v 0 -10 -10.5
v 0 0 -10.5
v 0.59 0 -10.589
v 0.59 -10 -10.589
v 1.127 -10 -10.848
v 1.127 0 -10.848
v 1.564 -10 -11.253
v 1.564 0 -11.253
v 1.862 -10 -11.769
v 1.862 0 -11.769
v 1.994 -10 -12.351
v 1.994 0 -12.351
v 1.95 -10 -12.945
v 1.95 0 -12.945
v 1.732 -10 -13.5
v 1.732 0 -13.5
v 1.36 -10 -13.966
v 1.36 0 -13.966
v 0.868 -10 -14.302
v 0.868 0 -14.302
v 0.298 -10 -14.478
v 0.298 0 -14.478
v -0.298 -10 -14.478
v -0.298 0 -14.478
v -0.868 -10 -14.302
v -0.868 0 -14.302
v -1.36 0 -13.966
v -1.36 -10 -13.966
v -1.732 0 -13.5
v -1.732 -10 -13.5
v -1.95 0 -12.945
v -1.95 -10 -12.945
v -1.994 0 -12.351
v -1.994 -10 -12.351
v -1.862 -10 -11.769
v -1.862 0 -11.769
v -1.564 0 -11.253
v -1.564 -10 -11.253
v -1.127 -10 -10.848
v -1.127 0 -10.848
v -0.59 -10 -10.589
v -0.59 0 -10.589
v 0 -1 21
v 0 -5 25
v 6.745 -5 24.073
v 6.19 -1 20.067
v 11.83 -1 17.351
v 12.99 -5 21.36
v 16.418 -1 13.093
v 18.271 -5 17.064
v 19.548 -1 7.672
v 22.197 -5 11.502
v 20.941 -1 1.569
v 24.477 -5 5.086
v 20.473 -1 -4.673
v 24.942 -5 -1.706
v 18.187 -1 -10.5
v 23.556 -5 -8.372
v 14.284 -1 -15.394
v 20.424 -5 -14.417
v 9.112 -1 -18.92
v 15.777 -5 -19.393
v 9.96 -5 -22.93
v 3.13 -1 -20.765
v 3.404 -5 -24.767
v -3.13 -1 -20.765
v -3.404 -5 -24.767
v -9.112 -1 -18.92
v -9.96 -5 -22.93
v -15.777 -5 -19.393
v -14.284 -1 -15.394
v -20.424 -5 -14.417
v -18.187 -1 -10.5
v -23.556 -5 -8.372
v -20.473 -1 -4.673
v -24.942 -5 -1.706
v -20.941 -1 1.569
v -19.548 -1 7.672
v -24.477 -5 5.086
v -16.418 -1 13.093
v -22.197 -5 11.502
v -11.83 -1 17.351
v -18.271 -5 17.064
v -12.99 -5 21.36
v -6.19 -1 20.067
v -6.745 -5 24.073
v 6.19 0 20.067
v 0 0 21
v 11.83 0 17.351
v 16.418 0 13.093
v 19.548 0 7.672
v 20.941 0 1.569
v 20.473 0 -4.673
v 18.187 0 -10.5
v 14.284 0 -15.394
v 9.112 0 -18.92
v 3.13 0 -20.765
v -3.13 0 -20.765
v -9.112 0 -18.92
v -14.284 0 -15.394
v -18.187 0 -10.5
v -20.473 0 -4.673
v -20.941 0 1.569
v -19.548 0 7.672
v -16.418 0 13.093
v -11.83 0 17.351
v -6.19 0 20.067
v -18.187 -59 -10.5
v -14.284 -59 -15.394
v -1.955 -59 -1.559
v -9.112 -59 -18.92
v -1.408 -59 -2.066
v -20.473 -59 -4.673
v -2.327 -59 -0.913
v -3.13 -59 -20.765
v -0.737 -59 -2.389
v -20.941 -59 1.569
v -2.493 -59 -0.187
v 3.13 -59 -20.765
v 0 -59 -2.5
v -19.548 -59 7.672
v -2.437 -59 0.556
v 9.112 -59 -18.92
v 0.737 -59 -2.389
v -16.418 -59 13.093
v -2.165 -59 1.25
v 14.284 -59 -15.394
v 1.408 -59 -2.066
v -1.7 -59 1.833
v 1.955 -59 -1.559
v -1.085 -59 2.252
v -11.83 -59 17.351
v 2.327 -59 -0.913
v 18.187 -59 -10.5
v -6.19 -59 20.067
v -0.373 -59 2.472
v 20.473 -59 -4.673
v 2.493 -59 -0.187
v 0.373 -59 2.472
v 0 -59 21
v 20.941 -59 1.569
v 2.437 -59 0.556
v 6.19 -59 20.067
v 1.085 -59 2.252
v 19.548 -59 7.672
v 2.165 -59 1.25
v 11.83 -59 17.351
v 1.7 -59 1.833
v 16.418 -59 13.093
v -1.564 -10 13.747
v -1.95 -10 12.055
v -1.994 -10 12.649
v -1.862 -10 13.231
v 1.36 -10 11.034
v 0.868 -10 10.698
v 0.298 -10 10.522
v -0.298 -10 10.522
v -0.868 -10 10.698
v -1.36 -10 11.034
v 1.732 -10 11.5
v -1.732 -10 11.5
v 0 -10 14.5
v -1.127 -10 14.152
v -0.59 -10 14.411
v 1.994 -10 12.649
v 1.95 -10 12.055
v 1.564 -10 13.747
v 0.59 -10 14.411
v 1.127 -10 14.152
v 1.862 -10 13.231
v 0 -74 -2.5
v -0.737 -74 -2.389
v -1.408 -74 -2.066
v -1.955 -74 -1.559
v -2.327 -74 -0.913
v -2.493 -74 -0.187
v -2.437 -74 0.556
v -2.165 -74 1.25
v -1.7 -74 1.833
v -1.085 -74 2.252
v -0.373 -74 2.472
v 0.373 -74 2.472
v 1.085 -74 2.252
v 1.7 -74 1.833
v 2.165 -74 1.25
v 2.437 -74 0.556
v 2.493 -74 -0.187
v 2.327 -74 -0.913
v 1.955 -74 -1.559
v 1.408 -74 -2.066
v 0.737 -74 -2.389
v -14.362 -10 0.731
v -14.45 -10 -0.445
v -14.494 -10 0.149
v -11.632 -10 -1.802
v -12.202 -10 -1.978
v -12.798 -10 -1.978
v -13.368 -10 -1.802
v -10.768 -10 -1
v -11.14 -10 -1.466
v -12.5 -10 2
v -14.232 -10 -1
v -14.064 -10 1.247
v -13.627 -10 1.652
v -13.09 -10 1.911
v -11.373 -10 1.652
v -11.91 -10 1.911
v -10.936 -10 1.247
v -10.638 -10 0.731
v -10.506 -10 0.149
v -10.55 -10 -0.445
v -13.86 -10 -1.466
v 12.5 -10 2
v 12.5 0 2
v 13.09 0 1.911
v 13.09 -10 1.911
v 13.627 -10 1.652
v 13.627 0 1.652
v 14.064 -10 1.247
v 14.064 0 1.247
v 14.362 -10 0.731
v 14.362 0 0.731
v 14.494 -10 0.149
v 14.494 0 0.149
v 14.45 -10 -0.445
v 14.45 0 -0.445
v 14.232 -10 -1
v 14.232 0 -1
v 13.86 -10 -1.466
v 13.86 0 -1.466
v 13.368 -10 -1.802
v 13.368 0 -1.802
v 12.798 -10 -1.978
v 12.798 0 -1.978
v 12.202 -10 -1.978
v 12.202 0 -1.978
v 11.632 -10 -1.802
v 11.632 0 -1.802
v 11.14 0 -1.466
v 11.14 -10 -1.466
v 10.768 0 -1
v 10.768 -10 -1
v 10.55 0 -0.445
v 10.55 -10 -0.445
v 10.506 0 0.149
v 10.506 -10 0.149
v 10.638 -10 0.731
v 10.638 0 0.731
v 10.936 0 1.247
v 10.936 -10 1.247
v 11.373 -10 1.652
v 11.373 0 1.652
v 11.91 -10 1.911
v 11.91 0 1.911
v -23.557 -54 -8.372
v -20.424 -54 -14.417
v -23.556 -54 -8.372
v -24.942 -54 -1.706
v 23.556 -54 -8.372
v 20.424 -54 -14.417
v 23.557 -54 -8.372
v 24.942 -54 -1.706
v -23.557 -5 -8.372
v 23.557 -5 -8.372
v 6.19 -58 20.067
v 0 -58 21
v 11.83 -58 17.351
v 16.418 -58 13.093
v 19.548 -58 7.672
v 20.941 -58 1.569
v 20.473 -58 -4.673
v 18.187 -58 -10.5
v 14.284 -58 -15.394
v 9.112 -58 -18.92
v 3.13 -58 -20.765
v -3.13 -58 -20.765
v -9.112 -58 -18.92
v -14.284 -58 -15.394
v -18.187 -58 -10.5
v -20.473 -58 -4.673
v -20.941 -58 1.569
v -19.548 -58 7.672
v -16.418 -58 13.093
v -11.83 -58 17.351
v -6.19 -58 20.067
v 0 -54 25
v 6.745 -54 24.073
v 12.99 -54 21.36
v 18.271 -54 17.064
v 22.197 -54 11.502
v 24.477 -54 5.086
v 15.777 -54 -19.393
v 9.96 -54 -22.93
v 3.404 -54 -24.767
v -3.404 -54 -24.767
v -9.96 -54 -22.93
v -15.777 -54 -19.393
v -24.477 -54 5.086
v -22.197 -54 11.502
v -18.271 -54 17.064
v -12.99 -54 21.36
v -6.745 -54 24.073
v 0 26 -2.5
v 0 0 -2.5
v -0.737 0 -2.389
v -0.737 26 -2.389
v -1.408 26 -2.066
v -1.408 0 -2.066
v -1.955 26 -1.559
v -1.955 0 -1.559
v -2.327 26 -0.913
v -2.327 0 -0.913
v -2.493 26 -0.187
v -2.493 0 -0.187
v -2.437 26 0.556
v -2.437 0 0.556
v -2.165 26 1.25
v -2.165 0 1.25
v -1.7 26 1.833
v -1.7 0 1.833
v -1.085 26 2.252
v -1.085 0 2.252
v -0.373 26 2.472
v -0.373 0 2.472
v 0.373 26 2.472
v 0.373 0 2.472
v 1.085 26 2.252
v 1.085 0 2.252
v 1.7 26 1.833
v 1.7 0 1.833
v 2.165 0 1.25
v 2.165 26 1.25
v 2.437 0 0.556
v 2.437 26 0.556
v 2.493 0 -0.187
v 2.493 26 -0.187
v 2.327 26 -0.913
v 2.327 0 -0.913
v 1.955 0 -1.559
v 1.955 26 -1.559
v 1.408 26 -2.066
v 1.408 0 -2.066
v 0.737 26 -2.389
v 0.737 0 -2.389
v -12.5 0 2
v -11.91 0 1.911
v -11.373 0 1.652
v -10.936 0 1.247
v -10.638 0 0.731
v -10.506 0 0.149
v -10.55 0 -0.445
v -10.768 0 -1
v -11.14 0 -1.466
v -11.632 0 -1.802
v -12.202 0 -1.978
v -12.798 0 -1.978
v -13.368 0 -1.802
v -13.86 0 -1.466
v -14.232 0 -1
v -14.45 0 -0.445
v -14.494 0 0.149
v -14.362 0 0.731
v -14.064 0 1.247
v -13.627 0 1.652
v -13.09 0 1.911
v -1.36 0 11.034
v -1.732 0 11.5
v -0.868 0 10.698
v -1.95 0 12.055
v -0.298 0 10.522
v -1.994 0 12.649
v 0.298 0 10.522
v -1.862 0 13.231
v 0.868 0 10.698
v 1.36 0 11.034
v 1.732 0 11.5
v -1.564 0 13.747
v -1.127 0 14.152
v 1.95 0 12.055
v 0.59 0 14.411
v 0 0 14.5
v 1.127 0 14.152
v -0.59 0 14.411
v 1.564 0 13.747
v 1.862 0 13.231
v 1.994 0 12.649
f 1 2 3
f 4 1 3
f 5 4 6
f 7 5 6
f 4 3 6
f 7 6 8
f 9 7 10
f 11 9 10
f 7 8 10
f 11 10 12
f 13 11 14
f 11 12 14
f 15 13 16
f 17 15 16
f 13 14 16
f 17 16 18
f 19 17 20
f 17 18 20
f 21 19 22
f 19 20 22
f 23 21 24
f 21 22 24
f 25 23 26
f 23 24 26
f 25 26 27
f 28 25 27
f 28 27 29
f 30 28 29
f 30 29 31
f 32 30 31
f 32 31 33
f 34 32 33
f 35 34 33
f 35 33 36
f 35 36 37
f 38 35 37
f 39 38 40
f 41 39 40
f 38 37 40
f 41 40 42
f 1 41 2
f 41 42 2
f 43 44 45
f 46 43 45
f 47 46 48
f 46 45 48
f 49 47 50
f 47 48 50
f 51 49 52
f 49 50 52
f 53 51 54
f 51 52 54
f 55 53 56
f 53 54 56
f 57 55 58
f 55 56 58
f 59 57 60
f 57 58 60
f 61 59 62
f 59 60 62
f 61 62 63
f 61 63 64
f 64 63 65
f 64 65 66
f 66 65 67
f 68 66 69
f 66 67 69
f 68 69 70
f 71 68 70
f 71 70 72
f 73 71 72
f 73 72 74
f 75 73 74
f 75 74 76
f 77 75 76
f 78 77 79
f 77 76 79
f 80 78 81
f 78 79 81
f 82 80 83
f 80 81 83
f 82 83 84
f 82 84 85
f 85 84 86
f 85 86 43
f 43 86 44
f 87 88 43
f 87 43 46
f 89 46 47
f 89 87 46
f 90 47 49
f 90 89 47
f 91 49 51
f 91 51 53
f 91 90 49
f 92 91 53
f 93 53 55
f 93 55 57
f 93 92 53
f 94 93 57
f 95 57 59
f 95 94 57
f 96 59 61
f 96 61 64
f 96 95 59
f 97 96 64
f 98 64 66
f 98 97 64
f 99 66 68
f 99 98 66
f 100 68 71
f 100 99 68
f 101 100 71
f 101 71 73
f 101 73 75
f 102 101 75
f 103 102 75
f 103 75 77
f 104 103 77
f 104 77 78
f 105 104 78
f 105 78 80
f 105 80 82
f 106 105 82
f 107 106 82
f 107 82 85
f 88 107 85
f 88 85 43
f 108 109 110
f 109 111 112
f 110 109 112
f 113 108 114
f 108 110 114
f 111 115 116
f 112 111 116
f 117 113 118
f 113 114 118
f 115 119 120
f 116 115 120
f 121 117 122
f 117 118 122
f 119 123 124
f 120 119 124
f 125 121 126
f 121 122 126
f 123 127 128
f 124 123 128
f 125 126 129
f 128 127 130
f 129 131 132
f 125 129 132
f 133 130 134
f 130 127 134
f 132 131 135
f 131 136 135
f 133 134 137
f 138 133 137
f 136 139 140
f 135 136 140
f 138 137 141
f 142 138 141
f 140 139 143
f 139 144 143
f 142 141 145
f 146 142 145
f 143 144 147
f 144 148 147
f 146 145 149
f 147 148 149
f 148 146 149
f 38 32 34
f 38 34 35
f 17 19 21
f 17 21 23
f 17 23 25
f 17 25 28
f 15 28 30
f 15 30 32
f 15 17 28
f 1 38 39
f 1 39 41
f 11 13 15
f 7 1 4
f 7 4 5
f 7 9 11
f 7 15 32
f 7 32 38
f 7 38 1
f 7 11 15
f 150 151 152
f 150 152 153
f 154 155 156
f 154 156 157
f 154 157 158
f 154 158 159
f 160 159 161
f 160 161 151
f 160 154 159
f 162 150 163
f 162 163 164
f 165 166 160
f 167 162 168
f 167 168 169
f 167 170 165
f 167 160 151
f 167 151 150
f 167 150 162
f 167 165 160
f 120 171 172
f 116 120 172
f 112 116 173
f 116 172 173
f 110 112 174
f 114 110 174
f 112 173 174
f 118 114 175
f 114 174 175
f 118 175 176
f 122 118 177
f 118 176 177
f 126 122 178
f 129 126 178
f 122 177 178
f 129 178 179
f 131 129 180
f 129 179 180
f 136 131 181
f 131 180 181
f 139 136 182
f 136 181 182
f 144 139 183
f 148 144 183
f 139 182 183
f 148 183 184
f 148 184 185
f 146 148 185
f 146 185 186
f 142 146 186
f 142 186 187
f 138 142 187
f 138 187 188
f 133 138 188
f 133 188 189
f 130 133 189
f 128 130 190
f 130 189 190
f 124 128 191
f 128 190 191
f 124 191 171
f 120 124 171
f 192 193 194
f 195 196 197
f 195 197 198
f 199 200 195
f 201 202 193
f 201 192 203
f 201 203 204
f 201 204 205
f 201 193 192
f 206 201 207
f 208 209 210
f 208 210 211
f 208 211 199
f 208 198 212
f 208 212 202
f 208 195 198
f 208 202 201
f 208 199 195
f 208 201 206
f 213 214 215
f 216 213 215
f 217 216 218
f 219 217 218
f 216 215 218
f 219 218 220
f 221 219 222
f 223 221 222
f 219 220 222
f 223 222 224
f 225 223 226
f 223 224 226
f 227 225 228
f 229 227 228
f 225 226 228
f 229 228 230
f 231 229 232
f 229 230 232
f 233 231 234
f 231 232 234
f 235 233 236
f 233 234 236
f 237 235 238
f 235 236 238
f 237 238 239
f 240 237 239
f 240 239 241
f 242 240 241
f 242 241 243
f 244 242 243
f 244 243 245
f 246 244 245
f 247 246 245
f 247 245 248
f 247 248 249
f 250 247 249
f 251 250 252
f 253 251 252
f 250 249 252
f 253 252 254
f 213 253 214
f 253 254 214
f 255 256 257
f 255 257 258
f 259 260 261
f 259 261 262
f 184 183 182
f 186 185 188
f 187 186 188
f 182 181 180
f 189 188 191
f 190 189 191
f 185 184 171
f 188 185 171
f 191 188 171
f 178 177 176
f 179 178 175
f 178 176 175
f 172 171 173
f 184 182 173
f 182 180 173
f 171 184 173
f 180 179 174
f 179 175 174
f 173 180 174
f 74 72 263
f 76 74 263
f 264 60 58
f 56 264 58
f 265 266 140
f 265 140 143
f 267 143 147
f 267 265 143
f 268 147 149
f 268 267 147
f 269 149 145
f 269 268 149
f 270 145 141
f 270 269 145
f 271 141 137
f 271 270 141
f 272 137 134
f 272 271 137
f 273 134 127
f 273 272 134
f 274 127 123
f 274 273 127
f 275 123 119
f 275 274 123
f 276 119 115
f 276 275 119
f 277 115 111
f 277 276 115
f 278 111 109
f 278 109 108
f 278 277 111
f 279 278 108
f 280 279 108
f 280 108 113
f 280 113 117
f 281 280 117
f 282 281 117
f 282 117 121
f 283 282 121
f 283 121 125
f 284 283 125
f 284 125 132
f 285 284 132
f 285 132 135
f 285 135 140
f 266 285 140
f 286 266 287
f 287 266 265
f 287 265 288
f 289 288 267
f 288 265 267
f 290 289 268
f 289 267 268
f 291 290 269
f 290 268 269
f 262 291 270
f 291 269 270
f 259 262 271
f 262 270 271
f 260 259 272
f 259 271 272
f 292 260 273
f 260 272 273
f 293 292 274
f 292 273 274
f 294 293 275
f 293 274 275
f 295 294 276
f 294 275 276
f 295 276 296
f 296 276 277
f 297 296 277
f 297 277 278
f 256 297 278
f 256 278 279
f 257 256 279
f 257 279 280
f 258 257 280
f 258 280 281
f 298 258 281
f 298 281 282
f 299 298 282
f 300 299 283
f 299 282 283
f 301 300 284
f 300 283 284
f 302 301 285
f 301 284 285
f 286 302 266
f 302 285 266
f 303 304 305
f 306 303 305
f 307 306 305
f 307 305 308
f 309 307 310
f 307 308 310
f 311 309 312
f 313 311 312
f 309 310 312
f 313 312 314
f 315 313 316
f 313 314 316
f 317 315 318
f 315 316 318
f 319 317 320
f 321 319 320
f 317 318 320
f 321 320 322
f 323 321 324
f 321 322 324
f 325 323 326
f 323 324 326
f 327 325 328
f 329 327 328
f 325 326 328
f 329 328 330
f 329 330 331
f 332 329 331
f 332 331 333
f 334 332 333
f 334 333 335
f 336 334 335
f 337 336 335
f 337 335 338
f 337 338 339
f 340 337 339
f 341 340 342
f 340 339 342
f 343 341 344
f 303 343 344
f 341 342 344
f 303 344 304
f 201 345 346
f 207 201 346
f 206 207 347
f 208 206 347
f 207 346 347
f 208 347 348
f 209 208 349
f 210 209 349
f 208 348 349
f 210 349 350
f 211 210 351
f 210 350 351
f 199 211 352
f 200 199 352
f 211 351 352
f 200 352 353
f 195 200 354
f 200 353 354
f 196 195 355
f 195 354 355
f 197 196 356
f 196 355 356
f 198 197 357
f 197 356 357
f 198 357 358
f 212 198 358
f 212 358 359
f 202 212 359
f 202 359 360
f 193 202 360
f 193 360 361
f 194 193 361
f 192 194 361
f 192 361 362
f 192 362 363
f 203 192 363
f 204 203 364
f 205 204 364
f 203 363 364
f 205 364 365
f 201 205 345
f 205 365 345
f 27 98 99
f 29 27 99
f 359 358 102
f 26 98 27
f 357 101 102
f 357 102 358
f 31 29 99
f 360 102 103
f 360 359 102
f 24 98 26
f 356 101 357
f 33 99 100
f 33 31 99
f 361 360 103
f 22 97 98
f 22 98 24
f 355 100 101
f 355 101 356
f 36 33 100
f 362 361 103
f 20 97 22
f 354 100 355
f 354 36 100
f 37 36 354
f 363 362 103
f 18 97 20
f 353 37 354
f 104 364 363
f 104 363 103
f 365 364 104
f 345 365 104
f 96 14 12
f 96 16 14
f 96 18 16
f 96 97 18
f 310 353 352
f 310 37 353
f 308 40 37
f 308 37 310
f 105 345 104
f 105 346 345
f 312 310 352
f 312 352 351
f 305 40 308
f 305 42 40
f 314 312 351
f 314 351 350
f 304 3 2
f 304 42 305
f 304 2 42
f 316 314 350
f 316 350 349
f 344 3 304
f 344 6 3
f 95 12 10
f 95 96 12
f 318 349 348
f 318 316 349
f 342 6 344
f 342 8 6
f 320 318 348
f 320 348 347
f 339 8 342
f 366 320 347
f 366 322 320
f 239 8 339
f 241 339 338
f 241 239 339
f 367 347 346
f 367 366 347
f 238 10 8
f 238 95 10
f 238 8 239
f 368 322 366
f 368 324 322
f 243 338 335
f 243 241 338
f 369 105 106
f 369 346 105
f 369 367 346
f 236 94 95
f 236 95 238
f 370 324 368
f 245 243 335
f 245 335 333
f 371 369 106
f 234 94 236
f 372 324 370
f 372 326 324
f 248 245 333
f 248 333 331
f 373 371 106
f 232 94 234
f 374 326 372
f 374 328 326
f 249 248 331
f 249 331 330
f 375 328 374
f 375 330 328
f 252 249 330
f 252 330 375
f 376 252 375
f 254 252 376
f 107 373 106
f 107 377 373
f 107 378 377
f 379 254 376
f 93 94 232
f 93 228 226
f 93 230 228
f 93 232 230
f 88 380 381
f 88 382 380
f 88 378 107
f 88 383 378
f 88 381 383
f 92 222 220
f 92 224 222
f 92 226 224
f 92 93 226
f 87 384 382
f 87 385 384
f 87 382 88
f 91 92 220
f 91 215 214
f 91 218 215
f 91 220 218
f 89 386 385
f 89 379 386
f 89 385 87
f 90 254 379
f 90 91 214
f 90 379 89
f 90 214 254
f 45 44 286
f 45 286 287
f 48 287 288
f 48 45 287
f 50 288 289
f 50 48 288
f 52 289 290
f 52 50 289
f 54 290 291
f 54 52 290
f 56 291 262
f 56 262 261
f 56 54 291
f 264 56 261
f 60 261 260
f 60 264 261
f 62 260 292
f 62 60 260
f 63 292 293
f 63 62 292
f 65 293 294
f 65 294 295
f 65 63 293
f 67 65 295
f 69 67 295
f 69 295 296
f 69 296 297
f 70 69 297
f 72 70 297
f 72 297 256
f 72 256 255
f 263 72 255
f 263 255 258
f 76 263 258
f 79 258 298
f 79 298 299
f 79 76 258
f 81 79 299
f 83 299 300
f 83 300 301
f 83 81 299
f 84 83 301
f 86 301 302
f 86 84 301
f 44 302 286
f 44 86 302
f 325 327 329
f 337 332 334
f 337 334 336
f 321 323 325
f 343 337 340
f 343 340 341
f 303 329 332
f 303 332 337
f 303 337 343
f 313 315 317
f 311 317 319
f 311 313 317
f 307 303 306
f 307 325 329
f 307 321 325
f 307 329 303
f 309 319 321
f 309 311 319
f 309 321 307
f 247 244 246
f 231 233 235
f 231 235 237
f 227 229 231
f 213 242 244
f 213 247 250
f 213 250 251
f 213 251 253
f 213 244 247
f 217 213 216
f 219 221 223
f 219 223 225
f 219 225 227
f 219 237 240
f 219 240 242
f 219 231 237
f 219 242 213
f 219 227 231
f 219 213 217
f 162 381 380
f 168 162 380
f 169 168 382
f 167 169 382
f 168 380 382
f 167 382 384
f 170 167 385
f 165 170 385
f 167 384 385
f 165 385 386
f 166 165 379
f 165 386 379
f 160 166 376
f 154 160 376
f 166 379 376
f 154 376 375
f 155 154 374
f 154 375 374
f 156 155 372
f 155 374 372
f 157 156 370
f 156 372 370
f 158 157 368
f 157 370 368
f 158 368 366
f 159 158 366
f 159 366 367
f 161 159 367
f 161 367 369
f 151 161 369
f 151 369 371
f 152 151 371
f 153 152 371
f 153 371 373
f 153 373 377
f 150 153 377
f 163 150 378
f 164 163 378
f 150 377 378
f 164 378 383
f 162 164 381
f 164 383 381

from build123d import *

# Parameters (mm, degrees)
SKETCH1_R           = 21
BOSS_EXTRUDE1_DEPTH = 59
SKETCH1_3_R         = 2.5
BOSS_EXTRUDE2_DEPTH = 26
SKETCH1_4_R         = 2
CUT_EXTRUDE1_DEPTH  = 10
BOSS_EXTRUDE3_START = -5
SKETCH1_5_R         = 25
SKETCH1_5_R_2       = 21
BOSS_EXTRUDE3_DEPTH = 49
CHAMFER1_SIZE       = 4
BOSS_EXTRUDE4_START = -74
SKETCH1_6_R         = 2.5
BOSS_EXTRUDE4_DEPTH = 15


with BuildPart() as part:
    # Sketch1 → Boss-Extrude1 (new body)
    with BuildSketch(Plane(origin=(0, 0, 0), x_dir=(1, 0, 0), z_dir=(0, 1, 0))):
        with Locations(Location((0, 0, 0), (0, 0, 270))):
            Circle(SKETCH1_R)
    extrude(amount=-BOSS_EXTRUDE1_DEPTH)

    # Sketch1<3> → Boss-Extrude2 (add)
    with BuildSketch(Plane(origin=(0, 0, 0), x_dir=(1, 0, 0), z_dir=(0, 1, 0))):
        with Locations(Location((0, 0, 0), (0, 0, 90))):
            Circle(SKETCH1_3_R)
    extrude(amount=BOSS_EXTRUDE2_DEPTH)

    # Sketch1<4> → Cut-Extrude1 (cut)
    with BuildSketch(Plane(origin=(0, 0, 0), x_dir=(1, 0, 0), z_dir=(0, 1, 0))):
        with Locations(Location((-12.5, 0, 0), (0, 0, 270))):
            Circle(SKETCH1_4_R)
        with Locations(Location((0, 12.5, 0), (0, 0, 270))):
            Circle(SKETCH1_4_R)
        with Locations(Location((12.5, 0, 0), (0, 0, 270))):
            Circle(SKETCH1_4_R)
        with Locations(Location((0, -12.5, 0), (0, 0, 270))):
            Circle(SKETCH1_4_R)
    extrude(amount=-CUT_EXTRUDE1_DEPTH, mode=Mode.SUBTRACT)

    # Sketch1<5> → Boss-Extrude3 (add)
    with BuildSketch(Plane(origin=(0, 0, 0), x_dir=(1, 0, 0), z_dir=(0, 1, 0)).offset(BOSS_EXTRUDE3_START)):
        with Locations(Location((0, 0, 0), (0, 0, 270))):
            Circle(SKETCH1_5_R)
        with Locations(Location((0, 0, 0), (0, 0, 270))):
            Circle(SKETCH1_5_R_2, mode=Mode.SUBTRACT)
    extrude(amount=-BOSS_EXTRUDE3_DEPTH)

    # Chamfer1
    chamfer1_edges = [part.edges().sort_by_distance(p)[0] for p in [
        (0, -5, -21),
        (0, -54, -21),
    ]]
    chamfer(chamfer1_edges, length=CHAMFER1_SIZE - 0.0001)  # a hair under: the kernel refuses the full size

    # Sketch1<6> → Boss-Extrude4 (add)
    with BuildSketch(Plane(origin=(0, 0, 0), x_dir=(1, 0, 0), z_dir=(0, 1, 0)).offset(BOSS_EXTRUDE4_START)):
        with Locations(Location((0, 0, 0), (0, 0, 90))):
            Circle(SKETCH1_6_R)
    extrude(amount=BOSS_EXTRUDE4_DEPTH)


solid = part.part
